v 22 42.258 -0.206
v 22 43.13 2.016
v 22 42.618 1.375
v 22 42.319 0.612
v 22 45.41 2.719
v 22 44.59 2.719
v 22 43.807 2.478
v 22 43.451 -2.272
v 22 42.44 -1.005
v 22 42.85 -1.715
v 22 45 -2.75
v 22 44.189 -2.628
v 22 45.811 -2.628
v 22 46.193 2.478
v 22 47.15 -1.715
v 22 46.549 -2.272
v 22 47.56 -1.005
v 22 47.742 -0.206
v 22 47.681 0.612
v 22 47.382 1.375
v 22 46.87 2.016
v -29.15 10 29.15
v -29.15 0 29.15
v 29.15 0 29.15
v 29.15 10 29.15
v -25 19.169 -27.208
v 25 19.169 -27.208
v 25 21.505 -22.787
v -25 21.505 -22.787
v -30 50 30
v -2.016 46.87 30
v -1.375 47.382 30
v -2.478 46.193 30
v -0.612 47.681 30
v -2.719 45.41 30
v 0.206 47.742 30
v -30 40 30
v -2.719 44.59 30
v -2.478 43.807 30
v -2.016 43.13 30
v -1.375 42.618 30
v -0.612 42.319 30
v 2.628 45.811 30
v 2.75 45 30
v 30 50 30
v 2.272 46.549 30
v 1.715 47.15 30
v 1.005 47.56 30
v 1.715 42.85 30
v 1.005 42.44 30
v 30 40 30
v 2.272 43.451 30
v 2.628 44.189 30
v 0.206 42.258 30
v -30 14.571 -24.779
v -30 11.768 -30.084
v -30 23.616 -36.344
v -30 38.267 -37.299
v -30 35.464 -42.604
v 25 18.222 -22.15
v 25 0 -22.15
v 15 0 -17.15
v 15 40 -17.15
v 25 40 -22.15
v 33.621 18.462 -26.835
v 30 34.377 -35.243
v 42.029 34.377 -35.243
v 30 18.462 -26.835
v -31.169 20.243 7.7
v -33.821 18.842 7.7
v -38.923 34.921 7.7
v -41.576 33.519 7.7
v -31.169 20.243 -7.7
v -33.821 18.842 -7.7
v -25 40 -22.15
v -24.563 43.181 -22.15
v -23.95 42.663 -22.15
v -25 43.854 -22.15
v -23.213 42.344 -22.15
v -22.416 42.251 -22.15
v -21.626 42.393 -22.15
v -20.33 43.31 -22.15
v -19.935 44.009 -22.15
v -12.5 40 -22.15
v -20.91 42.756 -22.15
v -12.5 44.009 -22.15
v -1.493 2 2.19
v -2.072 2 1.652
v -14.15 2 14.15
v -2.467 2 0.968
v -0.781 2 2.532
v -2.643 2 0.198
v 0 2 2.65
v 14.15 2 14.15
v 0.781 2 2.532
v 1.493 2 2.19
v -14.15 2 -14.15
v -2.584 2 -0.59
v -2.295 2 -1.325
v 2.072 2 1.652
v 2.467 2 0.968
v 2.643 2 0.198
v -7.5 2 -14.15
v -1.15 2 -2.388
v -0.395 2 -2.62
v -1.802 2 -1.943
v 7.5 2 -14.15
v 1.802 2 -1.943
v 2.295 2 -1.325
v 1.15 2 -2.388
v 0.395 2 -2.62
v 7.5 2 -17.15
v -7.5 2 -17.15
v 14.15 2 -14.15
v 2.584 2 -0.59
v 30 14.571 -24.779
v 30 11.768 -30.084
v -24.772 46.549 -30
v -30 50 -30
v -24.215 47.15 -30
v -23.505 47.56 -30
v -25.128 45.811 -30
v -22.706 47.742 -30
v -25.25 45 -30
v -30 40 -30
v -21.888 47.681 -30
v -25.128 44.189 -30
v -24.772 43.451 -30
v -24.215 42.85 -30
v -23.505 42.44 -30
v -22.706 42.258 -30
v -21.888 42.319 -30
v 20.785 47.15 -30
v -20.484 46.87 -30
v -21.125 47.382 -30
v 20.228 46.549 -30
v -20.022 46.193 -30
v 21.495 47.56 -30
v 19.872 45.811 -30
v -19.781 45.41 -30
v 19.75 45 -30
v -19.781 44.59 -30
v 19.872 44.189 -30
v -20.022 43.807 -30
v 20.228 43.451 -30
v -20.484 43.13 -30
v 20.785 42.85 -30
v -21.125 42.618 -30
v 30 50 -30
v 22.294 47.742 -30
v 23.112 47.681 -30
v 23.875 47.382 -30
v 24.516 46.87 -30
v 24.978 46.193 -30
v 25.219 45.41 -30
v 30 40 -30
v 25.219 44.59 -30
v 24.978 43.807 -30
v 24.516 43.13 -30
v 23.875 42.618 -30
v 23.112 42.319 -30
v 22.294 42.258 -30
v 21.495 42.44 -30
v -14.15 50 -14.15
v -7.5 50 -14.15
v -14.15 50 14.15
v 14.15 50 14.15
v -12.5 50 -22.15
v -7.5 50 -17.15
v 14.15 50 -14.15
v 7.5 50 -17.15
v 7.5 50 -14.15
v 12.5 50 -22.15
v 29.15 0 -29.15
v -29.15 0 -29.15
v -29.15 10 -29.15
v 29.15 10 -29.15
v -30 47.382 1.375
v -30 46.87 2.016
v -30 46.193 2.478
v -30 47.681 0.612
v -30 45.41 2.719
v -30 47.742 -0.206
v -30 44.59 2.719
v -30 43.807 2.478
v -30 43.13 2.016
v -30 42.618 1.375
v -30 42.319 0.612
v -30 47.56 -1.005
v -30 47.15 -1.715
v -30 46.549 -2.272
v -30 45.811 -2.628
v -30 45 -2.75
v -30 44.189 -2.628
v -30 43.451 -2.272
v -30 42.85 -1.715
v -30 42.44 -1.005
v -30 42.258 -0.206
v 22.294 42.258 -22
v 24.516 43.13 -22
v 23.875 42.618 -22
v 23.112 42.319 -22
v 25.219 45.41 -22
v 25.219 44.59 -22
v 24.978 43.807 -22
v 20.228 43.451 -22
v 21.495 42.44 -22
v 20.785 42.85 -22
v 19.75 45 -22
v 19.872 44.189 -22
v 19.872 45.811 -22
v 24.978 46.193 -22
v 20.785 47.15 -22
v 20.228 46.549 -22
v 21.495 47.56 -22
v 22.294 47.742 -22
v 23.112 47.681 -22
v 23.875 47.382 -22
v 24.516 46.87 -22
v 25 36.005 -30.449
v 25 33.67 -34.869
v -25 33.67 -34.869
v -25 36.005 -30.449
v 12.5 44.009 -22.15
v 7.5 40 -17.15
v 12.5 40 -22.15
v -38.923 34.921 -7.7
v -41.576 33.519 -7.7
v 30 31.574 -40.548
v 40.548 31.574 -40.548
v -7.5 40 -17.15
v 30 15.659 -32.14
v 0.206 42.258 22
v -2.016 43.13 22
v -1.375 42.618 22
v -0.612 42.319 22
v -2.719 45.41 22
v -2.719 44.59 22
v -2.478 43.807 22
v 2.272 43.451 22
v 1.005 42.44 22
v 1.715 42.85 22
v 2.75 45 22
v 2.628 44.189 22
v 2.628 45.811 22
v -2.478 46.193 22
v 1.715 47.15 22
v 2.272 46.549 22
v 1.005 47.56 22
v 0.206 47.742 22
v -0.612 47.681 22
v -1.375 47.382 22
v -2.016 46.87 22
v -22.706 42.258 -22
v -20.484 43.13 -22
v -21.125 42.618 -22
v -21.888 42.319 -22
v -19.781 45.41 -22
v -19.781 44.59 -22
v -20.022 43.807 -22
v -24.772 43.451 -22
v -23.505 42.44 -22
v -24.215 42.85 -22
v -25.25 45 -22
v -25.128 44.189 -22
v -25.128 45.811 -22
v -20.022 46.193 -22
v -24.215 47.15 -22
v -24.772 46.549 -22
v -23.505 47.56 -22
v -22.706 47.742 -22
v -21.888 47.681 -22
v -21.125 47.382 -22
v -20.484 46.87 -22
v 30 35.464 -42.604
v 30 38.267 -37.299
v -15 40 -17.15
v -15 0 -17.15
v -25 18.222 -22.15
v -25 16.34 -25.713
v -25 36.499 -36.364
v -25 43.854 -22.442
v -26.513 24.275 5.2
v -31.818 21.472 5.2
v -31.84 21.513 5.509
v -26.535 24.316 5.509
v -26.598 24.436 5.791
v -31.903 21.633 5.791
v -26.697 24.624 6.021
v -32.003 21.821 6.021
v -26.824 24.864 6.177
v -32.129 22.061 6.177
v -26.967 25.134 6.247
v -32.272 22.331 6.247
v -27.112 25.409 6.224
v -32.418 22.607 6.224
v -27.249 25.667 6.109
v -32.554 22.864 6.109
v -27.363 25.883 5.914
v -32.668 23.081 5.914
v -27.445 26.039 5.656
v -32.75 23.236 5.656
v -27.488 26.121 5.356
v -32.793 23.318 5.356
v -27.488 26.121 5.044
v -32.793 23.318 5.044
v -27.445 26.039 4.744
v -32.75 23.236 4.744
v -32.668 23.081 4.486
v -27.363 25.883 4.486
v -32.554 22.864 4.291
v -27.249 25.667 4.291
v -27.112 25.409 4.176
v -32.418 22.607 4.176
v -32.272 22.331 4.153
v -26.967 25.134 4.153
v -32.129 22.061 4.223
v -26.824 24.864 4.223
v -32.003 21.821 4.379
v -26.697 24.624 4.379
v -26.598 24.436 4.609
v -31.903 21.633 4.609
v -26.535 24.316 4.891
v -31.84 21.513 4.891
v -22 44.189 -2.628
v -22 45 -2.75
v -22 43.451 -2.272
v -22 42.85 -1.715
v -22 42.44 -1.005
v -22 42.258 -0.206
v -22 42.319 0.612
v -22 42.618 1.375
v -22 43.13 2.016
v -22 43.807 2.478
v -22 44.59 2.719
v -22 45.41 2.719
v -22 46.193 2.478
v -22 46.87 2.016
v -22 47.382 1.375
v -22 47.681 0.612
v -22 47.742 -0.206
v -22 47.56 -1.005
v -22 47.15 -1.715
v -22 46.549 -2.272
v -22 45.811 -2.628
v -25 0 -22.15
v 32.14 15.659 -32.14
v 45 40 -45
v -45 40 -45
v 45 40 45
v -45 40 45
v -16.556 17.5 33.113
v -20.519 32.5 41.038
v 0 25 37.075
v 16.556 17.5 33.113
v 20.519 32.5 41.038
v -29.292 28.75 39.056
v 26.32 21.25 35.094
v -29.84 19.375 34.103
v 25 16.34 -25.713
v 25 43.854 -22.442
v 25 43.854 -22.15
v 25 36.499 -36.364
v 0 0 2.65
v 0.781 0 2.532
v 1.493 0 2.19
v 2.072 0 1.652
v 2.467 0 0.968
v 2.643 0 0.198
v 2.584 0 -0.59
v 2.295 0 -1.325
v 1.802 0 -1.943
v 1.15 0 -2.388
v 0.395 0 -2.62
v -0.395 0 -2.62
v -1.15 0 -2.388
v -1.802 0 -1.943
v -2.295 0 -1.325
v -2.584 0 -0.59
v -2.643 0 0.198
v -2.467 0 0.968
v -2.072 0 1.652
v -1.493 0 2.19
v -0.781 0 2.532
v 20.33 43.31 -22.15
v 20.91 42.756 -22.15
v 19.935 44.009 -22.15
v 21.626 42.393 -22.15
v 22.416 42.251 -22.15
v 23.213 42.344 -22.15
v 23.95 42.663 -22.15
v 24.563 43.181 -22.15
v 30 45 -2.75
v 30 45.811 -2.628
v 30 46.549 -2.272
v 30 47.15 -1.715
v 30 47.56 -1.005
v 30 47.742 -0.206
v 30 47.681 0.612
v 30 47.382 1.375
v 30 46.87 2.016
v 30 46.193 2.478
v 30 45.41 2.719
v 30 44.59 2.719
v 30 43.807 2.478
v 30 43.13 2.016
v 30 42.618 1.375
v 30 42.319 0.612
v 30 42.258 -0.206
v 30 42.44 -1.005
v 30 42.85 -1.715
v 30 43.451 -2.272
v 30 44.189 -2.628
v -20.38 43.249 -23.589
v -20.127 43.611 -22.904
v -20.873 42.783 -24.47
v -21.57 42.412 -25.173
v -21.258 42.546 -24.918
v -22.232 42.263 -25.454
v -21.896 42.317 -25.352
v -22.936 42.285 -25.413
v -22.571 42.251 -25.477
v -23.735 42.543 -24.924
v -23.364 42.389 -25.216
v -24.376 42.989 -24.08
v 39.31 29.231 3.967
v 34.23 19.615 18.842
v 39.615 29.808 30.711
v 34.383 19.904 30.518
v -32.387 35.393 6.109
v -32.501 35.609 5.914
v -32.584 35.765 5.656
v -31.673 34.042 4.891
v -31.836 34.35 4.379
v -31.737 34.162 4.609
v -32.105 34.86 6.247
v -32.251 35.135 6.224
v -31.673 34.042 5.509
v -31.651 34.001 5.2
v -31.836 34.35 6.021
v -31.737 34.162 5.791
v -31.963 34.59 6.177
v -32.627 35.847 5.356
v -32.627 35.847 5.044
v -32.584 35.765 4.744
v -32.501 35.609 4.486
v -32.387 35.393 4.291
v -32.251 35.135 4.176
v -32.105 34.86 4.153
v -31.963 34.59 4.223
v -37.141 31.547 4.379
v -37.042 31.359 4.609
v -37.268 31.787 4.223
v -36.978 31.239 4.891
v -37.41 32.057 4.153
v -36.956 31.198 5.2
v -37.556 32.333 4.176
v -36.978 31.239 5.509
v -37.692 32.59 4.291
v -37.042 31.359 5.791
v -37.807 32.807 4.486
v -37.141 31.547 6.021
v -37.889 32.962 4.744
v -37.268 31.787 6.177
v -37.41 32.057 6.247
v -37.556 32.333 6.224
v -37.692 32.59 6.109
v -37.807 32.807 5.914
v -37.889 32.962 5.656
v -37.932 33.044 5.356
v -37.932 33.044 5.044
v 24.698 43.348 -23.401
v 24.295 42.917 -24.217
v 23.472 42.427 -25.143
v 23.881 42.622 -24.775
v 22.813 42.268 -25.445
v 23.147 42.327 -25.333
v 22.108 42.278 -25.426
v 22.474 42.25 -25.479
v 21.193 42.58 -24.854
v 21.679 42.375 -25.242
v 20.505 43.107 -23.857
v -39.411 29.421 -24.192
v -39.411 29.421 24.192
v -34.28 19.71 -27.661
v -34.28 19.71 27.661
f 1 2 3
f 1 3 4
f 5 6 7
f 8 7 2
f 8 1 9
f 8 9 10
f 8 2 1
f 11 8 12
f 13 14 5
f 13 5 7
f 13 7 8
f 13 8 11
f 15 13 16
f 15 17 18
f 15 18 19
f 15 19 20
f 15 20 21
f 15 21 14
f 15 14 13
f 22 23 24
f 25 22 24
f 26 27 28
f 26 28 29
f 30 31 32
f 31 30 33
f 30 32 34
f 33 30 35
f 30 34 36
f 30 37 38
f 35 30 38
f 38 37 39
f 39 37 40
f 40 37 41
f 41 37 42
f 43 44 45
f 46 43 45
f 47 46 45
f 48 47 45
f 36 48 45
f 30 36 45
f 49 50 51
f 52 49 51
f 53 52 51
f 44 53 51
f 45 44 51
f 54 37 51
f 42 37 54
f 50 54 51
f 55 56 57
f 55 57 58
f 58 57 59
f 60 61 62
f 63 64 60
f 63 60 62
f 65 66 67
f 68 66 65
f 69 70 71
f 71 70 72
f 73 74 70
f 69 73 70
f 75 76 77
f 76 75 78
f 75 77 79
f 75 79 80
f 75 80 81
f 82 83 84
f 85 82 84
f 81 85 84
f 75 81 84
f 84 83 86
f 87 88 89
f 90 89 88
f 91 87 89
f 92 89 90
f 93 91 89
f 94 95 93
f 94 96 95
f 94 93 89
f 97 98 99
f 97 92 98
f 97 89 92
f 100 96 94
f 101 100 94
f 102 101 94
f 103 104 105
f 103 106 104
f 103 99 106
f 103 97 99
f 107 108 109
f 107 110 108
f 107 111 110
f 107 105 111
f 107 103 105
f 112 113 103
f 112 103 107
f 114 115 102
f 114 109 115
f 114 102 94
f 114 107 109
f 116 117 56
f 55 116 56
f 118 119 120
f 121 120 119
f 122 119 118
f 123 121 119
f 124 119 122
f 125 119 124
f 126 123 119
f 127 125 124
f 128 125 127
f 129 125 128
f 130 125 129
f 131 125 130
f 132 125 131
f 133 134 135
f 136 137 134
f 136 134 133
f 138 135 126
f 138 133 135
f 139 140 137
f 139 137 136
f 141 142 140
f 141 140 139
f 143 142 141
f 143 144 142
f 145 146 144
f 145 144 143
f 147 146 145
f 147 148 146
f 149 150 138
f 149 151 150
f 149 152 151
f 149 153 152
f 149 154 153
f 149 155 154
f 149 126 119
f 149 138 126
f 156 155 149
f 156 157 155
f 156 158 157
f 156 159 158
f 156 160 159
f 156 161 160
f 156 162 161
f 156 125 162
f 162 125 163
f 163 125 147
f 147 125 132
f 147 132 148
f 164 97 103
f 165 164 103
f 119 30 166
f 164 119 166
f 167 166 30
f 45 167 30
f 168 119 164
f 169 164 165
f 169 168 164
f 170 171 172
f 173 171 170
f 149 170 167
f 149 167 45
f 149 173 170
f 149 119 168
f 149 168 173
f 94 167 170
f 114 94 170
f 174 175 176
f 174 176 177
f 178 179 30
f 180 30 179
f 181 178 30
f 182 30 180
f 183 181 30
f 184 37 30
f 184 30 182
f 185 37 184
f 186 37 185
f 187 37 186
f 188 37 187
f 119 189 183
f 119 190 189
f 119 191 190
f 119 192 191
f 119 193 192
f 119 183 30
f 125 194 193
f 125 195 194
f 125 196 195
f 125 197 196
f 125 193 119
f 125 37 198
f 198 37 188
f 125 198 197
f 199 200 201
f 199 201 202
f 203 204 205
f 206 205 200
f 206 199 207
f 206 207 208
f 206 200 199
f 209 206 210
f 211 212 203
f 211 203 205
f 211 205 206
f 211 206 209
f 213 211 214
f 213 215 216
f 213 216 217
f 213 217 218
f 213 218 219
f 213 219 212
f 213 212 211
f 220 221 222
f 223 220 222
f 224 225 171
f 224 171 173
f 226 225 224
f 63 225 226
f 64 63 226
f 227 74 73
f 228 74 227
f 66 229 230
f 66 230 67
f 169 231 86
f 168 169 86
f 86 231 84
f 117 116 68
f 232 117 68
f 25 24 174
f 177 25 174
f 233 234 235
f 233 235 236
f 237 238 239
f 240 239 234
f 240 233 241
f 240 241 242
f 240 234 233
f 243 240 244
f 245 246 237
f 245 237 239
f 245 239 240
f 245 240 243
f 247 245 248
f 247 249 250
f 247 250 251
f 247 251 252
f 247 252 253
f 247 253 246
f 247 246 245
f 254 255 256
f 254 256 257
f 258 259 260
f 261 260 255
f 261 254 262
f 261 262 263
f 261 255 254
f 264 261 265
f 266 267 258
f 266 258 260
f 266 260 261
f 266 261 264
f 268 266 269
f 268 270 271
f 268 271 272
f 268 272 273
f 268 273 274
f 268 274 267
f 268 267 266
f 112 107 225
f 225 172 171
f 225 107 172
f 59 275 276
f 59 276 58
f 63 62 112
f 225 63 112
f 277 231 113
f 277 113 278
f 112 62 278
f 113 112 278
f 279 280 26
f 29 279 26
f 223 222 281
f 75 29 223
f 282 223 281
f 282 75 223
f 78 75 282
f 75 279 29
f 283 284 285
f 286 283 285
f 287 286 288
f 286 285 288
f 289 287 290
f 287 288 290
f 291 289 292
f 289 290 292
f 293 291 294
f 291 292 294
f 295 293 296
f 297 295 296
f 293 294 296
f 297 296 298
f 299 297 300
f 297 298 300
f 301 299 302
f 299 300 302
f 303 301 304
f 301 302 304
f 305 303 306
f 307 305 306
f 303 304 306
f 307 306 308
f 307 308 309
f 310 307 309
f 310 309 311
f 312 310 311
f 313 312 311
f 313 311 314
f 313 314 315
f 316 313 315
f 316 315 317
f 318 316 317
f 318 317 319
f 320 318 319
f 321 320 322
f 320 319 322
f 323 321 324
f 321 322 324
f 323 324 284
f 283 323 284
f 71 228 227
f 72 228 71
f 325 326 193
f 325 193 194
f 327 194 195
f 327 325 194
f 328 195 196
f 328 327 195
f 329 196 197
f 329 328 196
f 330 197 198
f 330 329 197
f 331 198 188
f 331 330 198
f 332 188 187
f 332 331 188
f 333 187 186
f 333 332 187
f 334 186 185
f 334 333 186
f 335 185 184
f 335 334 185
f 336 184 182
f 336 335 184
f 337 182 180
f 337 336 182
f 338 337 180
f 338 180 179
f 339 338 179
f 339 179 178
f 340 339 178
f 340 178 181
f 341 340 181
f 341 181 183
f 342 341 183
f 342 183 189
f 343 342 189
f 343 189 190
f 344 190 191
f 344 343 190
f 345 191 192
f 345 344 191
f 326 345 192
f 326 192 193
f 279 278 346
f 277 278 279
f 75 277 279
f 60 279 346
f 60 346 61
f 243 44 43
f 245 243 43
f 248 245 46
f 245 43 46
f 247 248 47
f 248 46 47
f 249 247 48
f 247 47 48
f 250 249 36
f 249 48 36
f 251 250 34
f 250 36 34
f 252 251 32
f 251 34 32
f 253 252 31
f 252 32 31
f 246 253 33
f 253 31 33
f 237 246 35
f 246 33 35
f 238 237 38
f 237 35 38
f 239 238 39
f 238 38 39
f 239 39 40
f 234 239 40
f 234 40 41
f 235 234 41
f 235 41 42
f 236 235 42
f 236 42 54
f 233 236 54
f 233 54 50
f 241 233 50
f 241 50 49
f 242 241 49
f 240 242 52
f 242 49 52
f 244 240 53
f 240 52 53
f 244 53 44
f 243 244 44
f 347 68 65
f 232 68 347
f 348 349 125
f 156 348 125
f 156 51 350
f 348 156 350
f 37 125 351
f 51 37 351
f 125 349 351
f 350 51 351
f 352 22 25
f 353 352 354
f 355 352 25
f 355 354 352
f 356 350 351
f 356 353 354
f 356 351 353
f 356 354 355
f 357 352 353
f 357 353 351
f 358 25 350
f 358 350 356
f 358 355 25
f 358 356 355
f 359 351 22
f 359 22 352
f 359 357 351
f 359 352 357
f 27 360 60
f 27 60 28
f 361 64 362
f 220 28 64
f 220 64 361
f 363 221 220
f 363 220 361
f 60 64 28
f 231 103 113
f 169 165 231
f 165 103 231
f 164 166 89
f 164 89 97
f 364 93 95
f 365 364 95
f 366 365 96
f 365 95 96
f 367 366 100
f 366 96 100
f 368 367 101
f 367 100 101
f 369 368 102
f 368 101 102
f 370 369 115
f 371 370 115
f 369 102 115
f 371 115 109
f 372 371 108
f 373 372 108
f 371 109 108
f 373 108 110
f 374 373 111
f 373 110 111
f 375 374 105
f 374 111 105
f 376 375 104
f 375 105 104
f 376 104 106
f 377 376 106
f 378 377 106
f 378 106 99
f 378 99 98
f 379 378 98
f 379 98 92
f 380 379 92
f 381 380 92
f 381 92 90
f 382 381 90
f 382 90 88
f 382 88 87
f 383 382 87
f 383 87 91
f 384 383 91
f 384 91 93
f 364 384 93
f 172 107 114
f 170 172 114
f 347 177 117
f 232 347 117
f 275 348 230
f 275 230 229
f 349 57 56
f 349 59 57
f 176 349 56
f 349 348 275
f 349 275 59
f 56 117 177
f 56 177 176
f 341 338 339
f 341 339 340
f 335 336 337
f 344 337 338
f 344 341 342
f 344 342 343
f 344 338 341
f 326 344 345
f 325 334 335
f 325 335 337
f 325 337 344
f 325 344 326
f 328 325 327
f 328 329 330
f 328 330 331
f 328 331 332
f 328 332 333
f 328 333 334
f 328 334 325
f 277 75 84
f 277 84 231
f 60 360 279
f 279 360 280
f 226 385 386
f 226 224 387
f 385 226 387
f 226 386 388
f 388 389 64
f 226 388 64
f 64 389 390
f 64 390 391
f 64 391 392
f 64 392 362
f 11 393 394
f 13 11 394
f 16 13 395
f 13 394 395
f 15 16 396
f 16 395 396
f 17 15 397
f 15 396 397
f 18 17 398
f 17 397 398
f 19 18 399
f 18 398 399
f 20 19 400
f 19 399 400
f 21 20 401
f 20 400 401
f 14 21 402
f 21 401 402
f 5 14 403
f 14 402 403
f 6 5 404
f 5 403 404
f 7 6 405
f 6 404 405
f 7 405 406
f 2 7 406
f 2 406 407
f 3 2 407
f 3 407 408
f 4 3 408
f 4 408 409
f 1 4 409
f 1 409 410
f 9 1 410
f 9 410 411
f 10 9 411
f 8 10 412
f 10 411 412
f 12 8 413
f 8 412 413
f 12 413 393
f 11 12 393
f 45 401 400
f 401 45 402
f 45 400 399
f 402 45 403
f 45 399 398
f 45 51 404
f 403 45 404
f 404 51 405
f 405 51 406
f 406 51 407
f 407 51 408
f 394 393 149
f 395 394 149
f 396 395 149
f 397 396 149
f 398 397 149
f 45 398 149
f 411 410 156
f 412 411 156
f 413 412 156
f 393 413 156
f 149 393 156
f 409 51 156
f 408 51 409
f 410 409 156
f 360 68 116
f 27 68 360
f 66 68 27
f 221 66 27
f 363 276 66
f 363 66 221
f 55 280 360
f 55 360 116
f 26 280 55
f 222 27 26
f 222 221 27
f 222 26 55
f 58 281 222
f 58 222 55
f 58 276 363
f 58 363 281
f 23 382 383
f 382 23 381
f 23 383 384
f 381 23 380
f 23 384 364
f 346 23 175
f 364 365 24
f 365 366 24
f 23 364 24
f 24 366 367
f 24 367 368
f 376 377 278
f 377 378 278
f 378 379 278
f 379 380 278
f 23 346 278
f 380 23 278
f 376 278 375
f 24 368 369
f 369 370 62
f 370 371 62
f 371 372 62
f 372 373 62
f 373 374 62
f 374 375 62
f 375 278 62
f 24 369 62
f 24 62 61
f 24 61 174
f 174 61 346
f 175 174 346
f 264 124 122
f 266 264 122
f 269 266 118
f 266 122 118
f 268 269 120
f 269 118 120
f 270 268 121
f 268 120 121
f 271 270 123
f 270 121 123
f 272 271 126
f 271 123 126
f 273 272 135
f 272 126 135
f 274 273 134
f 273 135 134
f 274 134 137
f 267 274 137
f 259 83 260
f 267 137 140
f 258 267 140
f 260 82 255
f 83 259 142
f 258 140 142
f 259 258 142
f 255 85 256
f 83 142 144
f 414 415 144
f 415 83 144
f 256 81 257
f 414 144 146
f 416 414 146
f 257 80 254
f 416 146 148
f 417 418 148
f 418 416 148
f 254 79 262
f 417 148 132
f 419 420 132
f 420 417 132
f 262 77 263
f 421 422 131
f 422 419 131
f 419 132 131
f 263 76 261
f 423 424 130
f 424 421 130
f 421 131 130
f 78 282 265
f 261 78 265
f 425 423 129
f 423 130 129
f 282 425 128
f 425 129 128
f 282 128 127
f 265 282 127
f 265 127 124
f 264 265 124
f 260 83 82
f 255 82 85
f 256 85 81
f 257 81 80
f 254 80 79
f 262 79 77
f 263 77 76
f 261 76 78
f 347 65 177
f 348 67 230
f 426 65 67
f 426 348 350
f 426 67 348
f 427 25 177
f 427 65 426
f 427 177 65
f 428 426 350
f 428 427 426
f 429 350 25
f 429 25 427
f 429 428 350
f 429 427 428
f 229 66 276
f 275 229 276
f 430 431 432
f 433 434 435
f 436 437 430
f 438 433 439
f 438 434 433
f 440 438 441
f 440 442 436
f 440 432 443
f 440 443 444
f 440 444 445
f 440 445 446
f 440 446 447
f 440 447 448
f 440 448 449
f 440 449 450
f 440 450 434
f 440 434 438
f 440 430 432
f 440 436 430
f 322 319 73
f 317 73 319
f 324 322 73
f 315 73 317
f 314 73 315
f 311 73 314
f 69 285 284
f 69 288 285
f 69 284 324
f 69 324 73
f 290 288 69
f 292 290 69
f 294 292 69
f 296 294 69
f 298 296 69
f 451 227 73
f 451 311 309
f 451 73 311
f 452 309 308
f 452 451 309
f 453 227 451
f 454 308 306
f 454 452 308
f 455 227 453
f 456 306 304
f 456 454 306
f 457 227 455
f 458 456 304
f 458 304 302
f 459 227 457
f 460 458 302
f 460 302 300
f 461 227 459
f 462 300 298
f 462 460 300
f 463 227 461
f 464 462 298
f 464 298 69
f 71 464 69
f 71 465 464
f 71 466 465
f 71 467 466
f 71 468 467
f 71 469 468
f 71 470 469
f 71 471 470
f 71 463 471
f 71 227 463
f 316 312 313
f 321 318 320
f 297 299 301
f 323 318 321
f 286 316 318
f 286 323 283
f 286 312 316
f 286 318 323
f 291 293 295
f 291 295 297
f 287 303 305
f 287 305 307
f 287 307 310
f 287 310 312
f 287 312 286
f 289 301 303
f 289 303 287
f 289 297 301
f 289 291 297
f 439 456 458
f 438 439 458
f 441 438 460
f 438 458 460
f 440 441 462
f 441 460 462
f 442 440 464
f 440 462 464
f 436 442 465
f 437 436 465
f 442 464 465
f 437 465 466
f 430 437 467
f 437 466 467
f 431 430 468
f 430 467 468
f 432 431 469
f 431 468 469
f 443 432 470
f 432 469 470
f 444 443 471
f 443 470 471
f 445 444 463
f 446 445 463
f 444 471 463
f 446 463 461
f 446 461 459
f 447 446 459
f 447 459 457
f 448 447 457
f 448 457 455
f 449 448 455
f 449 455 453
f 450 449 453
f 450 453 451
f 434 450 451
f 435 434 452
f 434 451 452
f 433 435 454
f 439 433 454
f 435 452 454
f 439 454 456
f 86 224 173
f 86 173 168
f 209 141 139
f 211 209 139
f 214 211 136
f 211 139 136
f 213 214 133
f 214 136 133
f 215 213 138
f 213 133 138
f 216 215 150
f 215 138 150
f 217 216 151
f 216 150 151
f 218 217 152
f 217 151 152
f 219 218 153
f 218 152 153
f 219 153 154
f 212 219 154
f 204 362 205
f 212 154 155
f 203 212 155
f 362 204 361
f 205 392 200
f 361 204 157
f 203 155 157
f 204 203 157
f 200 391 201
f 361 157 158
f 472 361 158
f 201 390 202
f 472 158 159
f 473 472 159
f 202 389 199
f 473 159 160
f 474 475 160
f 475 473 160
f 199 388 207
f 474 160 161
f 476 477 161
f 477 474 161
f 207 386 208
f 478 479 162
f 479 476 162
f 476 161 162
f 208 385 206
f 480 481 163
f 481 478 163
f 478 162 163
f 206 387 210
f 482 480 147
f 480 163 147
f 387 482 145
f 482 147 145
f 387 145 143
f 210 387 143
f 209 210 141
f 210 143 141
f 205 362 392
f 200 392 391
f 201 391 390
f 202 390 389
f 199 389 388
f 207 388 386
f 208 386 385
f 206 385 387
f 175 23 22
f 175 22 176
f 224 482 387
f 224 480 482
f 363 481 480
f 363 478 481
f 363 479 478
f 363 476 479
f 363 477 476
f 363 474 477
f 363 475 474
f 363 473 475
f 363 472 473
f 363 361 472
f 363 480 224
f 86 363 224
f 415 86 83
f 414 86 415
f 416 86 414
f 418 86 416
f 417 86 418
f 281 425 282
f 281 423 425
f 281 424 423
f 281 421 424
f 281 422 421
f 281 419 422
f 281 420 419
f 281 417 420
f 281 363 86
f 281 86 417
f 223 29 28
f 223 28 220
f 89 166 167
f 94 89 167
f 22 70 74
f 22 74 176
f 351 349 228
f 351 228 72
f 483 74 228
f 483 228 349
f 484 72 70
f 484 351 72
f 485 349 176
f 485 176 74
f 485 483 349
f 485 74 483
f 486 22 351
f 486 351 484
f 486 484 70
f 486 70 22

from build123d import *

# Parameters (mm, degrees)
SKETCH1_W           = 58.3
SKETCH1_H           = 58.3
SKETCH1_W_2         = 28.3
SKETCH1_H_2         = 28.3
BOSS_EXTRUDE1_DEPTH = 10
SKETCH4_W           = 60
SKETCH4_H           = 60
BOSS_EXTRUDE2_DEPTH = 10
SKETCH6_W           = 60
SKETCH6_H           = 26.8
ESP32_DEPTH         = 6
SKETCH8_W           = 28.3
SKETCH8_H           = 28.3
CUT_EXTRUDE3_DEPTH  = 48
SKETCH10_W          = 30
SKETCH10_H          = 5
CUT_EXTRUDE5_DEPTH  = 50
CUT_EXTRUDE2_REACH  = 95.195
SKETCH7_W           = 50
SKETCH7_H           = 3.2
CUT_EXTRUDE6_START  = -10
CUT_EXTRUDE6_DEPTH  = 71.932070392
CUT_EXTRUDE7_START  = -25
CUT_EXTRUDE7_DEPTH  = 50
CUT_EXTRUDE8_REACH  = 102.747
SKETCH14_W          = 15
SKETCH14_H          = 3
CUT_EXTRUDE9_DEPTH  = 48
CHAMFER1_SIZE       = 7.5
CUT_EXTRUDE10_REACH = 81.712
SKETCH15_R          = 2.65
SKETCH16_W          = 15.4
SKETCH16_H          = 16.6
CANBUS_DEPTH        = 3
SKETCH18_R          = 1.05
M2_CANBUS_DEPTH     = 6
SKETCH19_R          = 2.75
CUT_EXTRUDE13_DEPTH = 8
SKETCH20_R          = 2.75
CUT_EXTRUDE14_DEPTH = 8
SKETCH21_R          = 2.75
CUT_EXTRUDE15_DEPTH = 8
CUT_EXTRUDE16_START = -8
SKETCH22_R          = 2.75
CUT_EXTRUDE16_DEPTH = 8


# Read off the part's stored shape, not the designer's step: Cut-Extrude7
with BuildPart() as part:
    # Sketch1 → Boss-Extrude1 (new body)
    # profile 1 of 2: a face of its own
    with BuildSketch(Plane(origin=(0, 0, 0), x_dir=(1, 0, 0), z_dir=(0, 1, 0))):
        Rectangle(SKETCH1_W, SKETCH1_H)
        Rectangle(SKETCH1_W_2, SKETCH1_H_2, mode=Mode.SUBTRACT)
    # profile 2 of 2: a face of its own
    with BuildSketch(Plane(origin=(0, 0, 0), x_dir=(1, 0, 0), z_dir=(0, 1, 0))):
        Rectangle(SKETCH1_W_2, SKETCH1_H_2)
    extrude(amount=BOSS_EXTRUDE1_DEPTH)

    # Sketch2 → section 1 of loft1
    with BuildSketch(Plane(origin=(0, 40, 0), x_dir=(1, 0, 0), z_dir=(0, 1, 0)), mode=Mode.PRIVATE) as loft1_s1:
        with BuildLine():
            Line((-45, -45), (45, -45))
            Line((45, -45), (45, 45))
            Line((45, 45), (-45, 45))
            Line((-45, 45), (-45, -45))
        make_face()
    # loft from a face of the part (loft1)
    loft([part.faces().sort_by_distance((0, 10, 0))[0], loft1_s1.sketch])

    # Sketch4 → Boss-Extrude2 (add)
    with BuildSketch(Plane(origin=(0, 40, 0), x_dir=(1, 0, 0), z_dir=(0, 1, 0))):
        Rectangle(SKETCH4_W, SKETCH4_H)
    extrude(amount=BOSS_EXTRUDE2_DEPTH)

    # Sketch6 → ESP32 (cut)
    with BuildSketch(Plane(origin=(0, -9.857868483, -18.658426151), x_dir=(-1, 0, 0), z_dir=(0, -0.4671427704257183, -0.8841818998594039))):
        with Locations((0, 37.859030757)):
            Rectangle(SKETCH6_W, SKETCH6_H)
    extrude(amount=-ESP32_DEPTH, mode=Mode.SUBTRACT)

    # Sketch8 → Cut-Extrude3 (cut)
    with BuildSketch(Plane(origin=(0, 50, 0), x_dir=(1, 0, 0), z_dir=(0, 1, 0))):
        Rectangle(SKETCH8_W, SKETCH8_H)
    extrude(amount=-CUT_EXTRUDE3_DEPTH, mode=Mode.SUBTRACT)

    # Sketch10 → Cut-Extrude5 (cut)
    with BuildSketch(Plane(origin=(0, 0, 0), x_dir=(-1, 0, 0), z_dir=(0, -1, 0))):
        with Locations((0, 19.65)):
            Rectangle(SKETCH10_W, SKETCH10_H)
    extrude(amount=-CUT_EXTRUDE5_DEPTH, mode=Mode.SUBTRACT)

    # Cut-Extrude2: up to this plane
    cut_extrude2_end = Plane(origin=(-15, 50, -22.15), z_dir=(0, 0, -1))
    # Sketch7 → Cut-Extrude2 (cut, up to the surface)
    with BuildSketch(Plane(origin=(0, -7.055011861, -13.353334752), x_dir=(-1, 0, 0), z_dir=(0, -0.46714277042571845, -0.8841818998594037)), mode=Mode.PRIVATE) as cut_extrude2_sk1:
        with Locations((0, 47.659030757)):
            Rectangle(SKETCH7_W, SKETCH7_H)
    cut_extrude2_tool1 = split(extrude(cut_extrude2_sk1.sketch, amount=-CUT_EXTRUDE2_REACH, mode=Mode.PRIVATE), bisect_by=cut_extrude2_end, keep=Keep.BOTH, mode=Mode.PRIVATE)
    add(cut_extrude2_tool1.solids().sort_by_distance((0, 35.08424, -35.616906))[0], mode=Mode.SUBTRACT)
    # Sketch7 → Cut-Extrude2 (cut, up to the surface)
    with BuildSketch(Plane(origin=(0, -7.055011861, -13.353334752), x_dir=(-1, 0, 0), z_dir=(0, -0.46714277042571845, -0.8841818998594037)), mode=Mode.PRIVATE) as cut_extrude2_sk2:
        with Locations((0, 28.059030757)):
            Rectangle(SKETCH7_W, SKETCH7_H)
    cut_extrude2_tool2 = split(extrude(cut_extrude2_sk2.sketch, amount=-CUT_EXTRUDE2_REACH, mode=Mode.PRIVATE), bisect_by=cut_extrude2_end, keep=Keep.BOTH, mode=Mode.PRIVATE)
    add(cut_extrude2_tool2.solids().sort_by_distance((0, 17.754275, -26.460908))[0], mode=Mode.SUBTRACT)

    # Sketch11 → Cut-Extrude6 (cut, through all)
    with BuildSketch(Plane(origin=(0, 50, 0), x_dir=(1, 0, 0), z_dir=(0, 1, 0)).offset(CUT_EXTRUDE6_START)):
        Polygon((-25, 22.15), (25, 22.15), (15, 17.15), (-15, 17.15), align=None)
    extrude(amount=-CUT_EXTRUDE6_DEPTH, mode=Mode.SUBTRACT)

    # Cut-Extrude7 outline → Cut-Extrude7 (cut)
    with BuildSketch(Plane.YZ.offset(CUT_EXTRUDE7_START)):
        Polygon((40.38967366, -22.15), (21.841454111, -22.15), (21.504680154, -22.787427049), (36.005263311, -30.448568484), align=None)
    extrude(amount=CUT_EXTRUDE7_DEPTH, mode=Mode.SUBTRACT)

    # Cut-Extrude8: up to this plane
    cut_extrude8_end = Plane(origin=(18.658426151, -9.857868483, 0), z_dir=(-0.884181899859404, 0.4671427704257181, 0))
    # Sketch13 → Cut-Extrude8 (cut, up to the surface)
    with BuildSketch(Plane.ZY.offset(-30), mode=Mode.PRIVATE) as cut_extrude8_sk1:
        Polygon((-32.139713731, 15.658764159), (-40.548283598, 31.574038357), (-35.243192199, 34.376894979), (-26.834622332, 18.461620782), align=None)
    cut_extrude8_tool1 = split(extrude(cut_extrude8_sk1.sketch, amount=-CUT_EXTRUDE8_REACH, mode=Mode.PRIVATE), bisect_by=cut_extrude8_end, keep=Keep.BOTH, mode=Mode.PRIVATE)
    add(cut_extrude8_tool1.solids().sort_by_distance((30, 25.01783, -33.691453))[0], mode=Mode.SUBTRACT)

    # Sketch14 → Cut-Extrude9 (cut)
    with BuildSketch(Plane(origin=(0, 50, 0), x_dir=(1, 0, 0), z_dir=(0, 1, 0))):
        with Locations((0, 15.65)):
            Rectangle(SKETCH14_W, SKETCH14_H)
    extrude(amount=-CUT_EXTRUDE9_DEPTH, mode=Mode.SUBTRACT)

    # Chamfer1
    # the kernel refuses this chamfer: 7.5 mm, written as the material it adds along each edge
    with BuildSketch(Plane(origin=(15, 40, -17.15), x_dir=(-0.9996219169112968, 0, 0.02749587661058632), z_dir=(0, 1, 0))) as chamfer1_piece_1_section:
        Polygon((CHAMFER1_SIZE * 0.999621916911, -CHAMFER1_SIZE * 0.0274958766106), (-CHAMFER1_SIZE * 0.0274958766106, -CHAMFER1_SIZE * 0.999621916911), (0, 0), align=None)
    chamfer1_piece_1 = extrude(amount=10, mode=Mode.PRIVATE)
    chamfer1_piece_1 = split(chamfer1_piece_1, bisect_by=Plane(origin=(12.200765376, 42.822931518, -22.15), z_dir=(0, 0, 1)), keep=Keep.TOP, mode=Mode.PRIVATE)
    add(chamfer1_piece_1)
    with BuildSketch(Plane(origin=(-15, 40, -17.15), x_dir=(0.9996219169112968, 0, 0.02749587661058632), z_dir=(0, 1, 0))) as chamfer1_piece_2_section:
        Polygon((CHAMFER1_SIZE * 0.999621916911, CHAMFER1_SIZE * 0.0274958766106), (-CHAMFER1_SIZE * 0.0274958766106, CHAMFER1_SIZE * 0.999621916911), (0, 0), align=None)
    chamfer1_piece_2 = extrude(amount=10, mode=Mode.PRIVATE)
    chamfer1_piece_2 = split(chamfer1_piece_2, bisect_by=Plane(origin=(-12.200765376, 42.822931518, -22.15), z_dir=(0, 0, 1)), keep=Keep.TOP, mode=Mode.PRIVATE)
    add(chamfer1_piece_2)

    # Sketch15 → Cut-Extrude10 (cut, up to next)
    with BuildSketch(Plane(origin=(0, 2, 0), x_dir=(1, 0, 0), z_dir=(0, 1, 0)), mode=Mode.PRIVATE) as cut_extrude10_sk1:
        with Locations(Location((0, 0, 0), (0, 0, 270))):
            Circle(SKETCH15_R)
    cut_extrude10_tool1 = extrude(cut_extrude10_sk1.sketch, amount=-CUT_EXTRUDE10_REACH, mode=Mode.PRIVATE) & part.part
    add(cut_extrude10_tool1.solids().sort_by_distance((0, 2, 0))[0], mode=Mode.SUBTRACT)

    # Sketch16 → CANbus (cut)
    with BuildSketch(Plane(origin=(-18.658426151, -9.857868483, 0), x_dir=(0, 0, 1), z_dir=(-0.8841818998594037, -0.46714277042571845, 0))):
        with Locations((0, 40.759030757)):
            Rectangle(SKETCH16_W, SKETCH16_H)
    extrude(amount=-CANBUS_DEPTH, mode=Mode.SUBTRACT)

    # Sketch18 → M2-CANbus (cut)
    with BuildSketch(Plane(origin=(-16.005880452, -8.456440172, 0), x_dir=(0, 0, 1), z_dir=(-0.8841818998594035, -0.46714277042571867, 0))):
        with Locations(Location((5.2, 45.898343703, 0), (0, 0, 270))):
            Circle(SKETCH18_R)
        with Locations(Location((5.2, 34.898343703, 0), (0, 0, 270))):
            Circle(SKETCH18_R)
    extrude(amount=-M2_CANBUS_DEPTH, mode=Mode.SUBTRACT)

    # Sketch19 → Cut-Extrude13 (cut)
    with BuildSketch(Plane(origin=(0, 0, -30), x_dir=(-1, 0, 0), z_dir=(0, 0, -1))):
        with Locations((-22.5, 45)):
            Circle(SKETCH19_R)
        with Locations((22.5, 45)):
            Circle(SKETCH19_R)
    extrude(amount=-CUT_EXTRUDE13_DEPTH, mode=Mode.SUBTRACT)

    # Sketch20 → Cut-Extrude14 (cut)
    with BuildSketch(Plane(origin=(30, 0, 0), x_dir=(0, 0, -1), z_dir=(1, 0, 0))):
        with Locations((0, 45)):
            Circle(SKETCH20_R)
    extrude(amount=-CUT_EXTRUDE14_DEPTH, mode=Mode.SUBTRACT)

    # Sketch21 → Cut-Extrude15 (cut)
    with BuildSketch(Plane.XY.offset(30)):
        with Locations((0, 45)):
            Circle(SKETCH21_R)
    extrude(amount=-CUT_EXTRUDE15_DEPTH, mode=Mode.SUBTRACT)

    # Sketch22 → Cut-Extrude16 (cut)
    with BuildSketch(Plane.ZY.offset(30).offset(CUT_EXTRUDE16_START)):
        with Locations(Location((0, 45, 0), (0, 0, 180))):
            Circle(SKETCH22_R)
    extrude(amount=CUT_EXTRUDE16_DEPTH, mode=Mode.SUBTRACT)


solid = part.part
